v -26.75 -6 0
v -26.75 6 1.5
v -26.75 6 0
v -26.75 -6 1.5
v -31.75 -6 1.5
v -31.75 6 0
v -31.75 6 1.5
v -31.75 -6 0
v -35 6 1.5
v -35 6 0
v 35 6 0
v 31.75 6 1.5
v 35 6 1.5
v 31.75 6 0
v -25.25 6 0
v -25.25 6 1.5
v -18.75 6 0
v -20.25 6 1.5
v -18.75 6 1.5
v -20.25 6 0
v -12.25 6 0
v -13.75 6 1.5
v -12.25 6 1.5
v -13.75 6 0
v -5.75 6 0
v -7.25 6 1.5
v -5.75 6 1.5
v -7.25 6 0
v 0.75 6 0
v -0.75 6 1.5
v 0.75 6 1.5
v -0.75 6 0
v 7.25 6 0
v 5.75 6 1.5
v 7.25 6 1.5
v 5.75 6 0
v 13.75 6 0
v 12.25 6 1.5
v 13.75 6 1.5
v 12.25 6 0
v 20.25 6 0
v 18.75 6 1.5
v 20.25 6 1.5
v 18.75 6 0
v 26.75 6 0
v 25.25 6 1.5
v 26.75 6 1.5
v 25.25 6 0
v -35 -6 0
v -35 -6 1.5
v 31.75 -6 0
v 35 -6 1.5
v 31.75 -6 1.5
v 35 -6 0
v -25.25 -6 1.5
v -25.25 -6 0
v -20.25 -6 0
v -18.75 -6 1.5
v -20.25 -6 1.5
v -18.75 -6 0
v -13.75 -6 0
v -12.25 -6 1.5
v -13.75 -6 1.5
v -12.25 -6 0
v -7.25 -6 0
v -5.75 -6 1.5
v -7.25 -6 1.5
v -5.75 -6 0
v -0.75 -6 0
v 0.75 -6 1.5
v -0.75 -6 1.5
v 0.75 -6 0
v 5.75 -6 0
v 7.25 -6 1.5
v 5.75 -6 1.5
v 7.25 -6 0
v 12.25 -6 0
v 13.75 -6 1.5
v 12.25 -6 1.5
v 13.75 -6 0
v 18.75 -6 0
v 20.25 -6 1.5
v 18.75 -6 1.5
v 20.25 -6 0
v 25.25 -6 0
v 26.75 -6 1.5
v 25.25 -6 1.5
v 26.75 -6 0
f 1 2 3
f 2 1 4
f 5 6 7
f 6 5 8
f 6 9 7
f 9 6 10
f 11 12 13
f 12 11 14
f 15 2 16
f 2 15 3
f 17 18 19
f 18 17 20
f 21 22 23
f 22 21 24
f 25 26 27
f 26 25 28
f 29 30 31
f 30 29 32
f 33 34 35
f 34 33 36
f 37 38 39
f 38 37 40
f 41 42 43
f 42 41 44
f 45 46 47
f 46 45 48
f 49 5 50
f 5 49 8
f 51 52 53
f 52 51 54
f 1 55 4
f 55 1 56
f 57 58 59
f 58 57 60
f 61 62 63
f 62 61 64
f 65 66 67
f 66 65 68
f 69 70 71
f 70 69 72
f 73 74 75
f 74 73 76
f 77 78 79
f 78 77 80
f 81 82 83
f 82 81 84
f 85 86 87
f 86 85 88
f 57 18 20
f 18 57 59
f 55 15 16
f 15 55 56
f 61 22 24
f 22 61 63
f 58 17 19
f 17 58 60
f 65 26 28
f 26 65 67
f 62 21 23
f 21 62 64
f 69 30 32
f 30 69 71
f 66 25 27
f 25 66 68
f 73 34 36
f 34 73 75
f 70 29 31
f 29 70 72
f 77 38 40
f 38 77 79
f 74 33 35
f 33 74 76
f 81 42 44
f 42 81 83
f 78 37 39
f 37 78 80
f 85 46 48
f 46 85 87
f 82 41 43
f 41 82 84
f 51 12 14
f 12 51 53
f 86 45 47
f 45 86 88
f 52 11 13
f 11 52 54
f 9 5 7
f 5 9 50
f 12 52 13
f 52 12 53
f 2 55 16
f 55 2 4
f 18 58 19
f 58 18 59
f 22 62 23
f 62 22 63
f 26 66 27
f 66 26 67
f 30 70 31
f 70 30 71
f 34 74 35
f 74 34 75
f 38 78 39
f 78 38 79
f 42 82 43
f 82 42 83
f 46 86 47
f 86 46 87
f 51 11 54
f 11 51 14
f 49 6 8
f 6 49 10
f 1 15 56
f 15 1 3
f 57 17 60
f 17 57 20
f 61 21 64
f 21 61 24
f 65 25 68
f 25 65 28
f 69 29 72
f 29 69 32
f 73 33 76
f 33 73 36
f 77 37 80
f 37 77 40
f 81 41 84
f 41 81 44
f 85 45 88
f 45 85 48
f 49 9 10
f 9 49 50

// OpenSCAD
// 10-well agarose comb - printed lying flat
// Units: mm

plate_t     = 1.5;   // plate thickness (Z)
spine_l     = 70;    // spine length (X)
spine_w     = 12;    // spine width (Y)
teeth_n     = 10;    // number of teeth
teeth_w     = 5;     // tooth width (X)
teeth_l     = 12;    // tooth length (Y)
teeth_gap   = 1.5;   // gap between teeth (X)
overcut     = 0.5;   // cutter overshoot past faces

$fn = 64;

pitch = teeth_w + teeth_gap;          // centre spacing
x0    = -(teeth_n - 1) * pitch / 2;   // first tooth centre

difference() {
    // Spine
    translate([-spine_l / 2, -spine_w / 2, 0])
        cube([spine_l, spine_w, plate_t]);

    // Teeth
    for (i = [0 : teeth_n - 1])
        translate([x0 + i * pitch - teeth_w / 2, -teeth_l / 2, -overcut])
            cube([teeth_w, teeth_l, plate_t + 2 * overcut]);
}
